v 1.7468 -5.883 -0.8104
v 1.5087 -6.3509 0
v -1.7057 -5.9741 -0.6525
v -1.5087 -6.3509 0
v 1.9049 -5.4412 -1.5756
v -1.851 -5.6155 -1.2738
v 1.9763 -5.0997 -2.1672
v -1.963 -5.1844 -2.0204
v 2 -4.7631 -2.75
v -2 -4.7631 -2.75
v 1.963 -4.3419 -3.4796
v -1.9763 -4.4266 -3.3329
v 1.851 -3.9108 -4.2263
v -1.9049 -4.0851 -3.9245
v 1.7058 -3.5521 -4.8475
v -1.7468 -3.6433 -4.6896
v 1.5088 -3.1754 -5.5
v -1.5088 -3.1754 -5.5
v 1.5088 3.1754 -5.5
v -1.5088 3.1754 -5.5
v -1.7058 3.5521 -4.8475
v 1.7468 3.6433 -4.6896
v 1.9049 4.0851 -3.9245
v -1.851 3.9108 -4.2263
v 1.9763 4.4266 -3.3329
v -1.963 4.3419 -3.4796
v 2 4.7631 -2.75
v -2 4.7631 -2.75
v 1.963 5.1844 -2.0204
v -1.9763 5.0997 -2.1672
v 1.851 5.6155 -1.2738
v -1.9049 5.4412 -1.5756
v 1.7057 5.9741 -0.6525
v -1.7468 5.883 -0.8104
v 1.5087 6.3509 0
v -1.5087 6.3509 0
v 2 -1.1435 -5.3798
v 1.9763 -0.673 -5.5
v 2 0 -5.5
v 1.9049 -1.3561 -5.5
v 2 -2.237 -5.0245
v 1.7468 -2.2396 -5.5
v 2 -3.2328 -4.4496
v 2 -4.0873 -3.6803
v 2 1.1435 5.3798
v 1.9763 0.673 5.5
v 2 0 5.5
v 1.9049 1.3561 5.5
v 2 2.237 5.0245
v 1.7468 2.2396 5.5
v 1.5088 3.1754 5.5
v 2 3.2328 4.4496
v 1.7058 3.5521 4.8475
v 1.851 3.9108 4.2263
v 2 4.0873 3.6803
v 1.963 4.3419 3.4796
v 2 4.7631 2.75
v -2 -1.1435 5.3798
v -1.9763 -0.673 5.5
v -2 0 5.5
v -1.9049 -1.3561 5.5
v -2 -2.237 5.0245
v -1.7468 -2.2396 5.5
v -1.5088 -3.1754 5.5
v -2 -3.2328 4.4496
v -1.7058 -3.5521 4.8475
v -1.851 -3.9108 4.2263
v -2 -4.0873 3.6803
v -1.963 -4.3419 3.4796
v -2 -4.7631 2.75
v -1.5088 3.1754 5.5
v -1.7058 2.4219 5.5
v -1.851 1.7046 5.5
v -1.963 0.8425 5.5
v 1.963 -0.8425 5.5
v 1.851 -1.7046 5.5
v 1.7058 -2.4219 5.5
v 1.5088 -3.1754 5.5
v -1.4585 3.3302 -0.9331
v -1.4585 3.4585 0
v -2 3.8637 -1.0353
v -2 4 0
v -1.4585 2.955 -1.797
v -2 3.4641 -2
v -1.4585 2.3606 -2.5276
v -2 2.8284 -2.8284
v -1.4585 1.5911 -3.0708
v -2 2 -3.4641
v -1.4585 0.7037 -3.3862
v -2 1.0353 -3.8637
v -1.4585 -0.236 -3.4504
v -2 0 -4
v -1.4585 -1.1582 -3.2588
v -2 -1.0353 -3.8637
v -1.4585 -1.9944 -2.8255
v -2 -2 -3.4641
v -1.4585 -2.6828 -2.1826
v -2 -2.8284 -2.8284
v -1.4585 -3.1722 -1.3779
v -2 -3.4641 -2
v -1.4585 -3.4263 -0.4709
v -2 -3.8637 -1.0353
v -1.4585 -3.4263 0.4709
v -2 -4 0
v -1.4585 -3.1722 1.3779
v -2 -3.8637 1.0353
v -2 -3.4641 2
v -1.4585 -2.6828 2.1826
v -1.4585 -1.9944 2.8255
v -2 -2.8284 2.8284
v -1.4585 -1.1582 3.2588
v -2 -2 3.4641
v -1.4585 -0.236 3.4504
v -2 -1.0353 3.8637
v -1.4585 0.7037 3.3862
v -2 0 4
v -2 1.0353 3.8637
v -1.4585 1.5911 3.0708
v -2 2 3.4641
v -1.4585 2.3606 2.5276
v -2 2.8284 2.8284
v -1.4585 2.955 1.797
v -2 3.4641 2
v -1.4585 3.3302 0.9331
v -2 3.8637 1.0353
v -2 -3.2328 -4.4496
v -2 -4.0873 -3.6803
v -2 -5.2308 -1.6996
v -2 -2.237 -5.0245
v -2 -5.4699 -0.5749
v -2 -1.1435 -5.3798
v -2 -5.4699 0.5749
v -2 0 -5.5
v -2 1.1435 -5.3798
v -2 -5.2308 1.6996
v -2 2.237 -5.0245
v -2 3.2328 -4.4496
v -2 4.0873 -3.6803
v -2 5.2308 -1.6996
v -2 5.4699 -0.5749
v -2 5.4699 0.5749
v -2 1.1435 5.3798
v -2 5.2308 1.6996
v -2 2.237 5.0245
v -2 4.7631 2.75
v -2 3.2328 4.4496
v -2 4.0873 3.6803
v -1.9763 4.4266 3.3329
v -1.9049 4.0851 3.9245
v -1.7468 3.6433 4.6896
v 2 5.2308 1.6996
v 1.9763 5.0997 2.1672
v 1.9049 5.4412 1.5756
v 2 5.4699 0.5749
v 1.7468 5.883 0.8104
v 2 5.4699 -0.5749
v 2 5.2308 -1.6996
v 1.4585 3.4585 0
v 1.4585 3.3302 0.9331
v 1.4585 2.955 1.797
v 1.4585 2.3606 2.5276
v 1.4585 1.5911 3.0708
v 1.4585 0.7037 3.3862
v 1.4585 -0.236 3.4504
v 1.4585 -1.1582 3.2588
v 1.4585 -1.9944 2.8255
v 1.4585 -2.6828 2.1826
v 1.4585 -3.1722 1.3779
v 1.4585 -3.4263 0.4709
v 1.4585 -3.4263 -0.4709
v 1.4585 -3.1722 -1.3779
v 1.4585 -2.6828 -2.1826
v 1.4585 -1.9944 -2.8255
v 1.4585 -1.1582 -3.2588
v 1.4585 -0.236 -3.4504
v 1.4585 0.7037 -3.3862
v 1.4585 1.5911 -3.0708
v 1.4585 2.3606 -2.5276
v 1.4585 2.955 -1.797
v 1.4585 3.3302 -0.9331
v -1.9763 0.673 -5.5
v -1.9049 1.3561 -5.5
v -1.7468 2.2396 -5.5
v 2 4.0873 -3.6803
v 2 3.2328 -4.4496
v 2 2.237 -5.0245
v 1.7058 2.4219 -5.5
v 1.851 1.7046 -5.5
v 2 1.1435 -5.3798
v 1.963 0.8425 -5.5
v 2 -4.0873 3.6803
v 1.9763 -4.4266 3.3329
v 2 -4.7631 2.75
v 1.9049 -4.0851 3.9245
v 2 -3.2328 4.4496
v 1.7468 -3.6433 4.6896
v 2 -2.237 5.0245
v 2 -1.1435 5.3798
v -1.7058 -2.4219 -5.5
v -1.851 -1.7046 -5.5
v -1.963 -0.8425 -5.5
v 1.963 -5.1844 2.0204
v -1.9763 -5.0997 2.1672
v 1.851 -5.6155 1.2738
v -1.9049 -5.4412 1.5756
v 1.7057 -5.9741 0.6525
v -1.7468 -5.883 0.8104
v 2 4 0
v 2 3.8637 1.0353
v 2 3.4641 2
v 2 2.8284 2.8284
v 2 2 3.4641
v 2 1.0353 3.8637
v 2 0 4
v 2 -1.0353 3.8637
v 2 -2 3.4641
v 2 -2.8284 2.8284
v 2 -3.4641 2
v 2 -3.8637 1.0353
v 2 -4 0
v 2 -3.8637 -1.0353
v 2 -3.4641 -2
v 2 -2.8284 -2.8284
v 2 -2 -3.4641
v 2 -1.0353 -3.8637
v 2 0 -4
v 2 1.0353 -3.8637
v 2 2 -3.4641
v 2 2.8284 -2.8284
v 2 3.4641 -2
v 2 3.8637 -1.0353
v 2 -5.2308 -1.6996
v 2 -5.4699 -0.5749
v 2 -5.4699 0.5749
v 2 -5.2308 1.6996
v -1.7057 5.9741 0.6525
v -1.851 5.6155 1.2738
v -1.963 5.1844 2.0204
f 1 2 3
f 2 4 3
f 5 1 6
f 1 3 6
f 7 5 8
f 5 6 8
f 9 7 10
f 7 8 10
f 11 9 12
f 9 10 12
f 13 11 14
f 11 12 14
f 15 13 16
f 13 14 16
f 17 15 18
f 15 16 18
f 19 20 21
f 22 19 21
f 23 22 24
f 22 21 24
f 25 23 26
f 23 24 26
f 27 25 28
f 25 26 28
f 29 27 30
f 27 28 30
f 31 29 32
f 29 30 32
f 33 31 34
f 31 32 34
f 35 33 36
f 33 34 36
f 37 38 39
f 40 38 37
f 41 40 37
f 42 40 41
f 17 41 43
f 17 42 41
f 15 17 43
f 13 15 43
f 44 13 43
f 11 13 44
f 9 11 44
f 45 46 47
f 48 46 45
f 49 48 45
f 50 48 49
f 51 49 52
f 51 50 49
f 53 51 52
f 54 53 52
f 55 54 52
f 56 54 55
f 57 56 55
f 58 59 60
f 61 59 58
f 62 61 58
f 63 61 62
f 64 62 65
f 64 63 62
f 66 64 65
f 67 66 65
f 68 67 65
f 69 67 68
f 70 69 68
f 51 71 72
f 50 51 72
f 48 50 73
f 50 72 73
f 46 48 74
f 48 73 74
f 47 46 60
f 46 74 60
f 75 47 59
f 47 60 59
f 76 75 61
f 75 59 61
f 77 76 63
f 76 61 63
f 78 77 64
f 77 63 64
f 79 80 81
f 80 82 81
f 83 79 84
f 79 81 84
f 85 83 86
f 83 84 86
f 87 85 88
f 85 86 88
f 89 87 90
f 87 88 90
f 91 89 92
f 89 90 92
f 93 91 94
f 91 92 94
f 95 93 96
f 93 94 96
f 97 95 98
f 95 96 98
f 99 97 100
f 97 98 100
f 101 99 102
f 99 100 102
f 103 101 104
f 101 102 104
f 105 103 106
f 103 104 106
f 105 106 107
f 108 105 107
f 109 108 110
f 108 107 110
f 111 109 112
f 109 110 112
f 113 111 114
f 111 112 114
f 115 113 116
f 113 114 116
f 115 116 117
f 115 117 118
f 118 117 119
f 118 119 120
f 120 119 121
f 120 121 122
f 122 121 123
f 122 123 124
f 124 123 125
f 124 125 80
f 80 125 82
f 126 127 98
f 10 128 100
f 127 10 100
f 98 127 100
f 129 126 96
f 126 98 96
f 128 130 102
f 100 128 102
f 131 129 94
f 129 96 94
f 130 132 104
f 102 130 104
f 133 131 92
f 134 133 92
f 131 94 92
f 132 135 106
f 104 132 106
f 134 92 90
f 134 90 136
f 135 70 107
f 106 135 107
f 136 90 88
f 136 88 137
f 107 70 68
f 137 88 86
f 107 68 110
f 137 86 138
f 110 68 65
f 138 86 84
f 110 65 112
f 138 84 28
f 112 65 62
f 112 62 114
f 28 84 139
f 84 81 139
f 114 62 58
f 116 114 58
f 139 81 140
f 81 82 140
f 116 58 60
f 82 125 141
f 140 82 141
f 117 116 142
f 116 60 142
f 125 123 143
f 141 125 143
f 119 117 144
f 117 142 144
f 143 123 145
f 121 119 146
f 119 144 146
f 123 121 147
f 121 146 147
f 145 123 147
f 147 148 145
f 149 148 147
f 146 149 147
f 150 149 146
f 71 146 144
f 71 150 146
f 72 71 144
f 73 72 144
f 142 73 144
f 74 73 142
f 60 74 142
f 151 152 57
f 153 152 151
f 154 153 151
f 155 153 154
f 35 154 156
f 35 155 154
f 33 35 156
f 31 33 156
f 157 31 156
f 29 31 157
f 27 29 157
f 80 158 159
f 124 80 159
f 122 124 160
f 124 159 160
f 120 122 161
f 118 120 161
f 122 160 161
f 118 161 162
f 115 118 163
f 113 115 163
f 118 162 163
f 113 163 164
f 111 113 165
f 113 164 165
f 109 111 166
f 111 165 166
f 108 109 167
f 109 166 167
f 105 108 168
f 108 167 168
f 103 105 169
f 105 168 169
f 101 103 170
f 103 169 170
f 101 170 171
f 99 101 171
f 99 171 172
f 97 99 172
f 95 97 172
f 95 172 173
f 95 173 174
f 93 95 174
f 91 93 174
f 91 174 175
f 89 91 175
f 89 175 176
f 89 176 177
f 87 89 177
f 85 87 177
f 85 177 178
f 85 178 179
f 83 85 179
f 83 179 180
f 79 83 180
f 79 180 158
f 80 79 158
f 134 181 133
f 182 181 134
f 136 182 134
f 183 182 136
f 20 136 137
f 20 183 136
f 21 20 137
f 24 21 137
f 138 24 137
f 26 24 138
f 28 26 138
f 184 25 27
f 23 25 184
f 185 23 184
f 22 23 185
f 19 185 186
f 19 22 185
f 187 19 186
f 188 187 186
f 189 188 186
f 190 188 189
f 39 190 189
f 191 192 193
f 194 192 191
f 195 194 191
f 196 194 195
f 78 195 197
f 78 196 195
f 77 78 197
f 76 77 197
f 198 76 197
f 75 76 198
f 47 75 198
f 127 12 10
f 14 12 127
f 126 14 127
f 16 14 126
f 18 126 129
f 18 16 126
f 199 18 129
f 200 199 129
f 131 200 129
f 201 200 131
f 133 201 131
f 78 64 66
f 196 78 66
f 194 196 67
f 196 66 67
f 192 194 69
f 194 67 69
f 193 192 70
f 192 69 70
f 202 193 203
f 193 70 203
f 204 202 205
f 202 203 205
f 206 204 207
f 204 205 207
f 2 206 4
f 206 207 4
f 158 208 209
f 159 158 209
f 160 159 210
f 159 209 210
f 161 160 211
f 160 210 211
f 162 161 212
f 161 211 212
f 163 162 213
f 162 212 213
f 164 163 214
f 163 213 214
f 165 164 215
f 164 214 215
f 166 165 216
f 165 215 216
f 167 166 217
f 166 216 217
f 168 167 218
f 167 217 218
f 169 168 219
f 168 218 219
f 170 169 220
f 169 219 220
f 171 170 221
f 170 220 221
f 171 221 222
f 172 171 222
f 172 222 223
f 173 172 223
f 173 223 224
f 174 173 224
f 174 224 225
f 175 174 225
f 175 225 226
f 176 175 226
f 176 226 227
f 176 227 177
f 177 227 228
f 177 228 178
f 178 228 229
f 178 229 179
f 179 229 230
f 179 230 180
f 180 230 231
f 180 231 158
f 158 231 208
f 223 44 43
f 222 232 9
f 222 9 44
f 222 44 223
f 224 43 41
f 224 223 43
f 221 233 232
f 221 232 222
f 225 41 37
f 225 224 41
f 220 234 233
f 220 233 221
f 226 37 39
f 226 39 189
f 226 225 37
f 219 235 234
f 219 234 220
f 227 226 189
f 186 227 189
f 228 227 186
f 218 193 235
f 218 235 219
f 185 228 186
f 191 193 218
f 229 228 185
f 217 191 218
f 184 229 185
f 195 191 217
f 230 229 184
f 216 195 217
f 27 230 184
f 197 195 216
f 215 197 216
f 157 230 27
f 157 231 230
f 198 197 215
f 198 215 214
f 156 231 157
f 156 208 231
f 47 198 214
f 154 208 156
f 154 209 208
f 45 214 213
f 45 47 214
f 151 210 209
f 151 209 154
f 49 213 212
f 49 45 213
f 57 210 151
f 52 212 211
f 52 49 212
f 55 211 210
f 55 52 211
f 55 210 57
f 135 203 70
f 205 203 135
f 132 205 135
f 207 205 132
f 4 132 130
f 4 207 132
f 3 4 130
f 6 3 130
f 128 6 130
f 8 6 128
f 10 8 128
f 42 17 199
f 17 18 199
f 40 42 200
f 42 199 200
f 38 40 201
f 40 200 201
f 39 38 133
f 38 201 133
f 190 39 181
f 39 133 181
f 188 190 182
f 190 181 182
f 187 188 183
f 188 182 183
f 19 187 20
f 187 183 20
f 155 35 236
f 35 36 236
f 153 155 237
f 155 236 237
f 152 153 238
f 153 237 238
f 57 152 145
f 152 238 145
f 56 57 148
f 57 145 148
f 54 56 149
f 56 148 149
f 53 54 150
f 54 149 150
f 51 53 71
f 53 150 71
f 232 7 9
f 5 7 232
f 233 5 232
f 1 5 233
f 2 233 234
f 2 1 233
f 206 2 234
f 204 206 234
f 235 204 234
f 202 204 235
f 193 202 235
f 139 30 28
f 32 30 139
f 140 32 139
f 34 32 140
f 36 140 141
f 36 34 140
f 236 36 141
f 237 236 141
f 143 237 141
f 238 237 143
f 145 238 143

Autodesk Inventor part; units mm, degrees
sketch "B" plane through (0, 0, 0) normal (1, 0, 0) x (0, 1, 0)
  line L0 (-3.1754, 5.5) -> (-6.3509, 0)
  line L1 (-6.3509, 0) -> (-3.1754, -5.5)
  line L2 (-3.1754, -5.5) -> (3.1754, -5.5)
  line L3 (3.1754, -5.5) -> (6.3509, 0)
  line L4 (6.3509, 0) -> (3.1754, 5.5)
  line L5 (3.1754, 5.5) -> (-3.1754, 5.5)
extrude "Extrusion1" add sketch "B" along normal mid plane 4
sketch "Sketch_2_ALT_Drilling_1" plane through (0, 0, 0) normal (0, 0, 1) x (1, 0, 0)
  line L0 (2, 0) -> (-2, 0)
  line L1 (-2, 0) -> (-2, 4)
  line L2 (-2, 4) -> (-1.4585, 3.4585)
  line L3 (-1.4585, 3.4585) -> (1.4585, 3.4585)
  line L4 (1.4585, 3.4585) -> (2, 4)
  line L5 (2, 4) -> (2, 0)
  line L6 (2, 0) -> (-2, 0)
revolve "Revolution1" cut sketch "Sketch_2_ALT_Drilling_1" angle 360 about axis through (2, 0, 0) along (1, 0, 0)
thread "Thread1" size "M8x1" class "6H" standard "ISO Metric profile" full length
sketch "Sketch_3" plane through (0, 0, 0) normal (0, 0, 1) x (1, 0, 0)
  line L0 (50, 0) -> (-50, 0)
  line L1 (-7, 1) -> (-2, 1)
  line L2 (-2, 1) -> (-2, 5.5)
  line L3 (-2, 5.5) -> (0, 8.9641)
  line L4 (0, 8.9641) -> (2, 5.5)
  line L5 (2, 5.5) -> (2, 1)
  line L6 (2, 1) -> (7, 1)
  line L7 (7, 1) -> (7, 13.5)
  line L8 (7, 13.5) -> (-7, 13.5)
  line L9 (-7, 13.5) -> (-7, 1)
revolve "Revolution2" cut sketch "Sketch_3" angle 360 about axis through (50, 0, 0) along (1, 0, 0)
ref_plane "nt_XY" through (0, 0, 0) normal (1, 0, 0) x (0, 0, -1)
ref_plane "nt_YZ" through (0, 0, 0) normal (0, 0, -1) x (0, 1, 0)
ref_plane "nt_ZX" through (0, 0, 0) normal (0, 1, 0) x (1, 0, 0)
ref_plane "ntj_XY" through (2, 0, 0) normal (1, 0, 0) x (0, 0, -1)
ref_plane "ntj_YZ" through (2, 0, 0) normal (0, 0, -1) x (0, 1, 0)
ref_plane "ntj_ZX" through (2, 0, 0) normal (0, 1, 0) x (1, 0, 0)
properties part number "SNJ-010C"
